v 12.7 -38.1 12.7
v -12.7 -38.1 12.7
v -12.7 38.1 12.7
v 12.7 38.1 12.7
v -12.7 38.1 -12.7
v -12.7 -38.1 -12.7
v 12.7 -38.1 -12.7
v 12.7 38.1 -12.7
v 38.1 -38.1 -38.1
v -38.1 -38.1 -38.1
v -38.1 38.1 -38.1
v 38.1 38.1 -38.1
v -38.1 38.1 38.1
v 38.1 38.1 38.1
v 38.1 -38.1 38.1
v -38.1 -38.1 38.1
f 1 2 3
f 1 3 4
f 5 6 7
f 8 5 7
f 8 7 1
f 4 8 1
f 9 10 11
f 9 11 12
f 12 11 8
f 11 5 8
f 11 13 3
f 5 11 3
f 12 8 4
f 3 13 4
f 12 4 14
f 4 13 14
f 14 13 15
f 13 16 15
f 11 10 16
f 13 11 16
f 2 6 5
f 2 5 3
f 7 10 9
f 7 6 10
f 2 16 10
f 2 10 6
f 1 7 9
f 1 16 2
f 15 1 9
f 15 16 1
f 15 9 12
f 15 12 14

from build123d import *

# Parameters (mm, degrees)
F0_W     = 76.2
F0_H     = 76.2
F1_DEPTH = 38.1
F3_W     = 25.4
F3_H     = 25.4
F4_DEPTH = 76.201


with BuildPart() as f1:
    # F0 (on Front) → F1 (new body, symmetric)
    with BuildSketch(Plane.XZ):
        Rectangle(F0_W, F0_H)
    extrude(amount=F1_DEPTH, both=True)

    # F3 (on face) → F4 (cut, through all)
    with BuildSketch(Plane.XZ.offset(38.1)):
        Rectangle(F3_W, F3_H)
    extrude(amount=-F4_DEPTH, mode=Mode.SUBTRACT)


solid = f1.part
